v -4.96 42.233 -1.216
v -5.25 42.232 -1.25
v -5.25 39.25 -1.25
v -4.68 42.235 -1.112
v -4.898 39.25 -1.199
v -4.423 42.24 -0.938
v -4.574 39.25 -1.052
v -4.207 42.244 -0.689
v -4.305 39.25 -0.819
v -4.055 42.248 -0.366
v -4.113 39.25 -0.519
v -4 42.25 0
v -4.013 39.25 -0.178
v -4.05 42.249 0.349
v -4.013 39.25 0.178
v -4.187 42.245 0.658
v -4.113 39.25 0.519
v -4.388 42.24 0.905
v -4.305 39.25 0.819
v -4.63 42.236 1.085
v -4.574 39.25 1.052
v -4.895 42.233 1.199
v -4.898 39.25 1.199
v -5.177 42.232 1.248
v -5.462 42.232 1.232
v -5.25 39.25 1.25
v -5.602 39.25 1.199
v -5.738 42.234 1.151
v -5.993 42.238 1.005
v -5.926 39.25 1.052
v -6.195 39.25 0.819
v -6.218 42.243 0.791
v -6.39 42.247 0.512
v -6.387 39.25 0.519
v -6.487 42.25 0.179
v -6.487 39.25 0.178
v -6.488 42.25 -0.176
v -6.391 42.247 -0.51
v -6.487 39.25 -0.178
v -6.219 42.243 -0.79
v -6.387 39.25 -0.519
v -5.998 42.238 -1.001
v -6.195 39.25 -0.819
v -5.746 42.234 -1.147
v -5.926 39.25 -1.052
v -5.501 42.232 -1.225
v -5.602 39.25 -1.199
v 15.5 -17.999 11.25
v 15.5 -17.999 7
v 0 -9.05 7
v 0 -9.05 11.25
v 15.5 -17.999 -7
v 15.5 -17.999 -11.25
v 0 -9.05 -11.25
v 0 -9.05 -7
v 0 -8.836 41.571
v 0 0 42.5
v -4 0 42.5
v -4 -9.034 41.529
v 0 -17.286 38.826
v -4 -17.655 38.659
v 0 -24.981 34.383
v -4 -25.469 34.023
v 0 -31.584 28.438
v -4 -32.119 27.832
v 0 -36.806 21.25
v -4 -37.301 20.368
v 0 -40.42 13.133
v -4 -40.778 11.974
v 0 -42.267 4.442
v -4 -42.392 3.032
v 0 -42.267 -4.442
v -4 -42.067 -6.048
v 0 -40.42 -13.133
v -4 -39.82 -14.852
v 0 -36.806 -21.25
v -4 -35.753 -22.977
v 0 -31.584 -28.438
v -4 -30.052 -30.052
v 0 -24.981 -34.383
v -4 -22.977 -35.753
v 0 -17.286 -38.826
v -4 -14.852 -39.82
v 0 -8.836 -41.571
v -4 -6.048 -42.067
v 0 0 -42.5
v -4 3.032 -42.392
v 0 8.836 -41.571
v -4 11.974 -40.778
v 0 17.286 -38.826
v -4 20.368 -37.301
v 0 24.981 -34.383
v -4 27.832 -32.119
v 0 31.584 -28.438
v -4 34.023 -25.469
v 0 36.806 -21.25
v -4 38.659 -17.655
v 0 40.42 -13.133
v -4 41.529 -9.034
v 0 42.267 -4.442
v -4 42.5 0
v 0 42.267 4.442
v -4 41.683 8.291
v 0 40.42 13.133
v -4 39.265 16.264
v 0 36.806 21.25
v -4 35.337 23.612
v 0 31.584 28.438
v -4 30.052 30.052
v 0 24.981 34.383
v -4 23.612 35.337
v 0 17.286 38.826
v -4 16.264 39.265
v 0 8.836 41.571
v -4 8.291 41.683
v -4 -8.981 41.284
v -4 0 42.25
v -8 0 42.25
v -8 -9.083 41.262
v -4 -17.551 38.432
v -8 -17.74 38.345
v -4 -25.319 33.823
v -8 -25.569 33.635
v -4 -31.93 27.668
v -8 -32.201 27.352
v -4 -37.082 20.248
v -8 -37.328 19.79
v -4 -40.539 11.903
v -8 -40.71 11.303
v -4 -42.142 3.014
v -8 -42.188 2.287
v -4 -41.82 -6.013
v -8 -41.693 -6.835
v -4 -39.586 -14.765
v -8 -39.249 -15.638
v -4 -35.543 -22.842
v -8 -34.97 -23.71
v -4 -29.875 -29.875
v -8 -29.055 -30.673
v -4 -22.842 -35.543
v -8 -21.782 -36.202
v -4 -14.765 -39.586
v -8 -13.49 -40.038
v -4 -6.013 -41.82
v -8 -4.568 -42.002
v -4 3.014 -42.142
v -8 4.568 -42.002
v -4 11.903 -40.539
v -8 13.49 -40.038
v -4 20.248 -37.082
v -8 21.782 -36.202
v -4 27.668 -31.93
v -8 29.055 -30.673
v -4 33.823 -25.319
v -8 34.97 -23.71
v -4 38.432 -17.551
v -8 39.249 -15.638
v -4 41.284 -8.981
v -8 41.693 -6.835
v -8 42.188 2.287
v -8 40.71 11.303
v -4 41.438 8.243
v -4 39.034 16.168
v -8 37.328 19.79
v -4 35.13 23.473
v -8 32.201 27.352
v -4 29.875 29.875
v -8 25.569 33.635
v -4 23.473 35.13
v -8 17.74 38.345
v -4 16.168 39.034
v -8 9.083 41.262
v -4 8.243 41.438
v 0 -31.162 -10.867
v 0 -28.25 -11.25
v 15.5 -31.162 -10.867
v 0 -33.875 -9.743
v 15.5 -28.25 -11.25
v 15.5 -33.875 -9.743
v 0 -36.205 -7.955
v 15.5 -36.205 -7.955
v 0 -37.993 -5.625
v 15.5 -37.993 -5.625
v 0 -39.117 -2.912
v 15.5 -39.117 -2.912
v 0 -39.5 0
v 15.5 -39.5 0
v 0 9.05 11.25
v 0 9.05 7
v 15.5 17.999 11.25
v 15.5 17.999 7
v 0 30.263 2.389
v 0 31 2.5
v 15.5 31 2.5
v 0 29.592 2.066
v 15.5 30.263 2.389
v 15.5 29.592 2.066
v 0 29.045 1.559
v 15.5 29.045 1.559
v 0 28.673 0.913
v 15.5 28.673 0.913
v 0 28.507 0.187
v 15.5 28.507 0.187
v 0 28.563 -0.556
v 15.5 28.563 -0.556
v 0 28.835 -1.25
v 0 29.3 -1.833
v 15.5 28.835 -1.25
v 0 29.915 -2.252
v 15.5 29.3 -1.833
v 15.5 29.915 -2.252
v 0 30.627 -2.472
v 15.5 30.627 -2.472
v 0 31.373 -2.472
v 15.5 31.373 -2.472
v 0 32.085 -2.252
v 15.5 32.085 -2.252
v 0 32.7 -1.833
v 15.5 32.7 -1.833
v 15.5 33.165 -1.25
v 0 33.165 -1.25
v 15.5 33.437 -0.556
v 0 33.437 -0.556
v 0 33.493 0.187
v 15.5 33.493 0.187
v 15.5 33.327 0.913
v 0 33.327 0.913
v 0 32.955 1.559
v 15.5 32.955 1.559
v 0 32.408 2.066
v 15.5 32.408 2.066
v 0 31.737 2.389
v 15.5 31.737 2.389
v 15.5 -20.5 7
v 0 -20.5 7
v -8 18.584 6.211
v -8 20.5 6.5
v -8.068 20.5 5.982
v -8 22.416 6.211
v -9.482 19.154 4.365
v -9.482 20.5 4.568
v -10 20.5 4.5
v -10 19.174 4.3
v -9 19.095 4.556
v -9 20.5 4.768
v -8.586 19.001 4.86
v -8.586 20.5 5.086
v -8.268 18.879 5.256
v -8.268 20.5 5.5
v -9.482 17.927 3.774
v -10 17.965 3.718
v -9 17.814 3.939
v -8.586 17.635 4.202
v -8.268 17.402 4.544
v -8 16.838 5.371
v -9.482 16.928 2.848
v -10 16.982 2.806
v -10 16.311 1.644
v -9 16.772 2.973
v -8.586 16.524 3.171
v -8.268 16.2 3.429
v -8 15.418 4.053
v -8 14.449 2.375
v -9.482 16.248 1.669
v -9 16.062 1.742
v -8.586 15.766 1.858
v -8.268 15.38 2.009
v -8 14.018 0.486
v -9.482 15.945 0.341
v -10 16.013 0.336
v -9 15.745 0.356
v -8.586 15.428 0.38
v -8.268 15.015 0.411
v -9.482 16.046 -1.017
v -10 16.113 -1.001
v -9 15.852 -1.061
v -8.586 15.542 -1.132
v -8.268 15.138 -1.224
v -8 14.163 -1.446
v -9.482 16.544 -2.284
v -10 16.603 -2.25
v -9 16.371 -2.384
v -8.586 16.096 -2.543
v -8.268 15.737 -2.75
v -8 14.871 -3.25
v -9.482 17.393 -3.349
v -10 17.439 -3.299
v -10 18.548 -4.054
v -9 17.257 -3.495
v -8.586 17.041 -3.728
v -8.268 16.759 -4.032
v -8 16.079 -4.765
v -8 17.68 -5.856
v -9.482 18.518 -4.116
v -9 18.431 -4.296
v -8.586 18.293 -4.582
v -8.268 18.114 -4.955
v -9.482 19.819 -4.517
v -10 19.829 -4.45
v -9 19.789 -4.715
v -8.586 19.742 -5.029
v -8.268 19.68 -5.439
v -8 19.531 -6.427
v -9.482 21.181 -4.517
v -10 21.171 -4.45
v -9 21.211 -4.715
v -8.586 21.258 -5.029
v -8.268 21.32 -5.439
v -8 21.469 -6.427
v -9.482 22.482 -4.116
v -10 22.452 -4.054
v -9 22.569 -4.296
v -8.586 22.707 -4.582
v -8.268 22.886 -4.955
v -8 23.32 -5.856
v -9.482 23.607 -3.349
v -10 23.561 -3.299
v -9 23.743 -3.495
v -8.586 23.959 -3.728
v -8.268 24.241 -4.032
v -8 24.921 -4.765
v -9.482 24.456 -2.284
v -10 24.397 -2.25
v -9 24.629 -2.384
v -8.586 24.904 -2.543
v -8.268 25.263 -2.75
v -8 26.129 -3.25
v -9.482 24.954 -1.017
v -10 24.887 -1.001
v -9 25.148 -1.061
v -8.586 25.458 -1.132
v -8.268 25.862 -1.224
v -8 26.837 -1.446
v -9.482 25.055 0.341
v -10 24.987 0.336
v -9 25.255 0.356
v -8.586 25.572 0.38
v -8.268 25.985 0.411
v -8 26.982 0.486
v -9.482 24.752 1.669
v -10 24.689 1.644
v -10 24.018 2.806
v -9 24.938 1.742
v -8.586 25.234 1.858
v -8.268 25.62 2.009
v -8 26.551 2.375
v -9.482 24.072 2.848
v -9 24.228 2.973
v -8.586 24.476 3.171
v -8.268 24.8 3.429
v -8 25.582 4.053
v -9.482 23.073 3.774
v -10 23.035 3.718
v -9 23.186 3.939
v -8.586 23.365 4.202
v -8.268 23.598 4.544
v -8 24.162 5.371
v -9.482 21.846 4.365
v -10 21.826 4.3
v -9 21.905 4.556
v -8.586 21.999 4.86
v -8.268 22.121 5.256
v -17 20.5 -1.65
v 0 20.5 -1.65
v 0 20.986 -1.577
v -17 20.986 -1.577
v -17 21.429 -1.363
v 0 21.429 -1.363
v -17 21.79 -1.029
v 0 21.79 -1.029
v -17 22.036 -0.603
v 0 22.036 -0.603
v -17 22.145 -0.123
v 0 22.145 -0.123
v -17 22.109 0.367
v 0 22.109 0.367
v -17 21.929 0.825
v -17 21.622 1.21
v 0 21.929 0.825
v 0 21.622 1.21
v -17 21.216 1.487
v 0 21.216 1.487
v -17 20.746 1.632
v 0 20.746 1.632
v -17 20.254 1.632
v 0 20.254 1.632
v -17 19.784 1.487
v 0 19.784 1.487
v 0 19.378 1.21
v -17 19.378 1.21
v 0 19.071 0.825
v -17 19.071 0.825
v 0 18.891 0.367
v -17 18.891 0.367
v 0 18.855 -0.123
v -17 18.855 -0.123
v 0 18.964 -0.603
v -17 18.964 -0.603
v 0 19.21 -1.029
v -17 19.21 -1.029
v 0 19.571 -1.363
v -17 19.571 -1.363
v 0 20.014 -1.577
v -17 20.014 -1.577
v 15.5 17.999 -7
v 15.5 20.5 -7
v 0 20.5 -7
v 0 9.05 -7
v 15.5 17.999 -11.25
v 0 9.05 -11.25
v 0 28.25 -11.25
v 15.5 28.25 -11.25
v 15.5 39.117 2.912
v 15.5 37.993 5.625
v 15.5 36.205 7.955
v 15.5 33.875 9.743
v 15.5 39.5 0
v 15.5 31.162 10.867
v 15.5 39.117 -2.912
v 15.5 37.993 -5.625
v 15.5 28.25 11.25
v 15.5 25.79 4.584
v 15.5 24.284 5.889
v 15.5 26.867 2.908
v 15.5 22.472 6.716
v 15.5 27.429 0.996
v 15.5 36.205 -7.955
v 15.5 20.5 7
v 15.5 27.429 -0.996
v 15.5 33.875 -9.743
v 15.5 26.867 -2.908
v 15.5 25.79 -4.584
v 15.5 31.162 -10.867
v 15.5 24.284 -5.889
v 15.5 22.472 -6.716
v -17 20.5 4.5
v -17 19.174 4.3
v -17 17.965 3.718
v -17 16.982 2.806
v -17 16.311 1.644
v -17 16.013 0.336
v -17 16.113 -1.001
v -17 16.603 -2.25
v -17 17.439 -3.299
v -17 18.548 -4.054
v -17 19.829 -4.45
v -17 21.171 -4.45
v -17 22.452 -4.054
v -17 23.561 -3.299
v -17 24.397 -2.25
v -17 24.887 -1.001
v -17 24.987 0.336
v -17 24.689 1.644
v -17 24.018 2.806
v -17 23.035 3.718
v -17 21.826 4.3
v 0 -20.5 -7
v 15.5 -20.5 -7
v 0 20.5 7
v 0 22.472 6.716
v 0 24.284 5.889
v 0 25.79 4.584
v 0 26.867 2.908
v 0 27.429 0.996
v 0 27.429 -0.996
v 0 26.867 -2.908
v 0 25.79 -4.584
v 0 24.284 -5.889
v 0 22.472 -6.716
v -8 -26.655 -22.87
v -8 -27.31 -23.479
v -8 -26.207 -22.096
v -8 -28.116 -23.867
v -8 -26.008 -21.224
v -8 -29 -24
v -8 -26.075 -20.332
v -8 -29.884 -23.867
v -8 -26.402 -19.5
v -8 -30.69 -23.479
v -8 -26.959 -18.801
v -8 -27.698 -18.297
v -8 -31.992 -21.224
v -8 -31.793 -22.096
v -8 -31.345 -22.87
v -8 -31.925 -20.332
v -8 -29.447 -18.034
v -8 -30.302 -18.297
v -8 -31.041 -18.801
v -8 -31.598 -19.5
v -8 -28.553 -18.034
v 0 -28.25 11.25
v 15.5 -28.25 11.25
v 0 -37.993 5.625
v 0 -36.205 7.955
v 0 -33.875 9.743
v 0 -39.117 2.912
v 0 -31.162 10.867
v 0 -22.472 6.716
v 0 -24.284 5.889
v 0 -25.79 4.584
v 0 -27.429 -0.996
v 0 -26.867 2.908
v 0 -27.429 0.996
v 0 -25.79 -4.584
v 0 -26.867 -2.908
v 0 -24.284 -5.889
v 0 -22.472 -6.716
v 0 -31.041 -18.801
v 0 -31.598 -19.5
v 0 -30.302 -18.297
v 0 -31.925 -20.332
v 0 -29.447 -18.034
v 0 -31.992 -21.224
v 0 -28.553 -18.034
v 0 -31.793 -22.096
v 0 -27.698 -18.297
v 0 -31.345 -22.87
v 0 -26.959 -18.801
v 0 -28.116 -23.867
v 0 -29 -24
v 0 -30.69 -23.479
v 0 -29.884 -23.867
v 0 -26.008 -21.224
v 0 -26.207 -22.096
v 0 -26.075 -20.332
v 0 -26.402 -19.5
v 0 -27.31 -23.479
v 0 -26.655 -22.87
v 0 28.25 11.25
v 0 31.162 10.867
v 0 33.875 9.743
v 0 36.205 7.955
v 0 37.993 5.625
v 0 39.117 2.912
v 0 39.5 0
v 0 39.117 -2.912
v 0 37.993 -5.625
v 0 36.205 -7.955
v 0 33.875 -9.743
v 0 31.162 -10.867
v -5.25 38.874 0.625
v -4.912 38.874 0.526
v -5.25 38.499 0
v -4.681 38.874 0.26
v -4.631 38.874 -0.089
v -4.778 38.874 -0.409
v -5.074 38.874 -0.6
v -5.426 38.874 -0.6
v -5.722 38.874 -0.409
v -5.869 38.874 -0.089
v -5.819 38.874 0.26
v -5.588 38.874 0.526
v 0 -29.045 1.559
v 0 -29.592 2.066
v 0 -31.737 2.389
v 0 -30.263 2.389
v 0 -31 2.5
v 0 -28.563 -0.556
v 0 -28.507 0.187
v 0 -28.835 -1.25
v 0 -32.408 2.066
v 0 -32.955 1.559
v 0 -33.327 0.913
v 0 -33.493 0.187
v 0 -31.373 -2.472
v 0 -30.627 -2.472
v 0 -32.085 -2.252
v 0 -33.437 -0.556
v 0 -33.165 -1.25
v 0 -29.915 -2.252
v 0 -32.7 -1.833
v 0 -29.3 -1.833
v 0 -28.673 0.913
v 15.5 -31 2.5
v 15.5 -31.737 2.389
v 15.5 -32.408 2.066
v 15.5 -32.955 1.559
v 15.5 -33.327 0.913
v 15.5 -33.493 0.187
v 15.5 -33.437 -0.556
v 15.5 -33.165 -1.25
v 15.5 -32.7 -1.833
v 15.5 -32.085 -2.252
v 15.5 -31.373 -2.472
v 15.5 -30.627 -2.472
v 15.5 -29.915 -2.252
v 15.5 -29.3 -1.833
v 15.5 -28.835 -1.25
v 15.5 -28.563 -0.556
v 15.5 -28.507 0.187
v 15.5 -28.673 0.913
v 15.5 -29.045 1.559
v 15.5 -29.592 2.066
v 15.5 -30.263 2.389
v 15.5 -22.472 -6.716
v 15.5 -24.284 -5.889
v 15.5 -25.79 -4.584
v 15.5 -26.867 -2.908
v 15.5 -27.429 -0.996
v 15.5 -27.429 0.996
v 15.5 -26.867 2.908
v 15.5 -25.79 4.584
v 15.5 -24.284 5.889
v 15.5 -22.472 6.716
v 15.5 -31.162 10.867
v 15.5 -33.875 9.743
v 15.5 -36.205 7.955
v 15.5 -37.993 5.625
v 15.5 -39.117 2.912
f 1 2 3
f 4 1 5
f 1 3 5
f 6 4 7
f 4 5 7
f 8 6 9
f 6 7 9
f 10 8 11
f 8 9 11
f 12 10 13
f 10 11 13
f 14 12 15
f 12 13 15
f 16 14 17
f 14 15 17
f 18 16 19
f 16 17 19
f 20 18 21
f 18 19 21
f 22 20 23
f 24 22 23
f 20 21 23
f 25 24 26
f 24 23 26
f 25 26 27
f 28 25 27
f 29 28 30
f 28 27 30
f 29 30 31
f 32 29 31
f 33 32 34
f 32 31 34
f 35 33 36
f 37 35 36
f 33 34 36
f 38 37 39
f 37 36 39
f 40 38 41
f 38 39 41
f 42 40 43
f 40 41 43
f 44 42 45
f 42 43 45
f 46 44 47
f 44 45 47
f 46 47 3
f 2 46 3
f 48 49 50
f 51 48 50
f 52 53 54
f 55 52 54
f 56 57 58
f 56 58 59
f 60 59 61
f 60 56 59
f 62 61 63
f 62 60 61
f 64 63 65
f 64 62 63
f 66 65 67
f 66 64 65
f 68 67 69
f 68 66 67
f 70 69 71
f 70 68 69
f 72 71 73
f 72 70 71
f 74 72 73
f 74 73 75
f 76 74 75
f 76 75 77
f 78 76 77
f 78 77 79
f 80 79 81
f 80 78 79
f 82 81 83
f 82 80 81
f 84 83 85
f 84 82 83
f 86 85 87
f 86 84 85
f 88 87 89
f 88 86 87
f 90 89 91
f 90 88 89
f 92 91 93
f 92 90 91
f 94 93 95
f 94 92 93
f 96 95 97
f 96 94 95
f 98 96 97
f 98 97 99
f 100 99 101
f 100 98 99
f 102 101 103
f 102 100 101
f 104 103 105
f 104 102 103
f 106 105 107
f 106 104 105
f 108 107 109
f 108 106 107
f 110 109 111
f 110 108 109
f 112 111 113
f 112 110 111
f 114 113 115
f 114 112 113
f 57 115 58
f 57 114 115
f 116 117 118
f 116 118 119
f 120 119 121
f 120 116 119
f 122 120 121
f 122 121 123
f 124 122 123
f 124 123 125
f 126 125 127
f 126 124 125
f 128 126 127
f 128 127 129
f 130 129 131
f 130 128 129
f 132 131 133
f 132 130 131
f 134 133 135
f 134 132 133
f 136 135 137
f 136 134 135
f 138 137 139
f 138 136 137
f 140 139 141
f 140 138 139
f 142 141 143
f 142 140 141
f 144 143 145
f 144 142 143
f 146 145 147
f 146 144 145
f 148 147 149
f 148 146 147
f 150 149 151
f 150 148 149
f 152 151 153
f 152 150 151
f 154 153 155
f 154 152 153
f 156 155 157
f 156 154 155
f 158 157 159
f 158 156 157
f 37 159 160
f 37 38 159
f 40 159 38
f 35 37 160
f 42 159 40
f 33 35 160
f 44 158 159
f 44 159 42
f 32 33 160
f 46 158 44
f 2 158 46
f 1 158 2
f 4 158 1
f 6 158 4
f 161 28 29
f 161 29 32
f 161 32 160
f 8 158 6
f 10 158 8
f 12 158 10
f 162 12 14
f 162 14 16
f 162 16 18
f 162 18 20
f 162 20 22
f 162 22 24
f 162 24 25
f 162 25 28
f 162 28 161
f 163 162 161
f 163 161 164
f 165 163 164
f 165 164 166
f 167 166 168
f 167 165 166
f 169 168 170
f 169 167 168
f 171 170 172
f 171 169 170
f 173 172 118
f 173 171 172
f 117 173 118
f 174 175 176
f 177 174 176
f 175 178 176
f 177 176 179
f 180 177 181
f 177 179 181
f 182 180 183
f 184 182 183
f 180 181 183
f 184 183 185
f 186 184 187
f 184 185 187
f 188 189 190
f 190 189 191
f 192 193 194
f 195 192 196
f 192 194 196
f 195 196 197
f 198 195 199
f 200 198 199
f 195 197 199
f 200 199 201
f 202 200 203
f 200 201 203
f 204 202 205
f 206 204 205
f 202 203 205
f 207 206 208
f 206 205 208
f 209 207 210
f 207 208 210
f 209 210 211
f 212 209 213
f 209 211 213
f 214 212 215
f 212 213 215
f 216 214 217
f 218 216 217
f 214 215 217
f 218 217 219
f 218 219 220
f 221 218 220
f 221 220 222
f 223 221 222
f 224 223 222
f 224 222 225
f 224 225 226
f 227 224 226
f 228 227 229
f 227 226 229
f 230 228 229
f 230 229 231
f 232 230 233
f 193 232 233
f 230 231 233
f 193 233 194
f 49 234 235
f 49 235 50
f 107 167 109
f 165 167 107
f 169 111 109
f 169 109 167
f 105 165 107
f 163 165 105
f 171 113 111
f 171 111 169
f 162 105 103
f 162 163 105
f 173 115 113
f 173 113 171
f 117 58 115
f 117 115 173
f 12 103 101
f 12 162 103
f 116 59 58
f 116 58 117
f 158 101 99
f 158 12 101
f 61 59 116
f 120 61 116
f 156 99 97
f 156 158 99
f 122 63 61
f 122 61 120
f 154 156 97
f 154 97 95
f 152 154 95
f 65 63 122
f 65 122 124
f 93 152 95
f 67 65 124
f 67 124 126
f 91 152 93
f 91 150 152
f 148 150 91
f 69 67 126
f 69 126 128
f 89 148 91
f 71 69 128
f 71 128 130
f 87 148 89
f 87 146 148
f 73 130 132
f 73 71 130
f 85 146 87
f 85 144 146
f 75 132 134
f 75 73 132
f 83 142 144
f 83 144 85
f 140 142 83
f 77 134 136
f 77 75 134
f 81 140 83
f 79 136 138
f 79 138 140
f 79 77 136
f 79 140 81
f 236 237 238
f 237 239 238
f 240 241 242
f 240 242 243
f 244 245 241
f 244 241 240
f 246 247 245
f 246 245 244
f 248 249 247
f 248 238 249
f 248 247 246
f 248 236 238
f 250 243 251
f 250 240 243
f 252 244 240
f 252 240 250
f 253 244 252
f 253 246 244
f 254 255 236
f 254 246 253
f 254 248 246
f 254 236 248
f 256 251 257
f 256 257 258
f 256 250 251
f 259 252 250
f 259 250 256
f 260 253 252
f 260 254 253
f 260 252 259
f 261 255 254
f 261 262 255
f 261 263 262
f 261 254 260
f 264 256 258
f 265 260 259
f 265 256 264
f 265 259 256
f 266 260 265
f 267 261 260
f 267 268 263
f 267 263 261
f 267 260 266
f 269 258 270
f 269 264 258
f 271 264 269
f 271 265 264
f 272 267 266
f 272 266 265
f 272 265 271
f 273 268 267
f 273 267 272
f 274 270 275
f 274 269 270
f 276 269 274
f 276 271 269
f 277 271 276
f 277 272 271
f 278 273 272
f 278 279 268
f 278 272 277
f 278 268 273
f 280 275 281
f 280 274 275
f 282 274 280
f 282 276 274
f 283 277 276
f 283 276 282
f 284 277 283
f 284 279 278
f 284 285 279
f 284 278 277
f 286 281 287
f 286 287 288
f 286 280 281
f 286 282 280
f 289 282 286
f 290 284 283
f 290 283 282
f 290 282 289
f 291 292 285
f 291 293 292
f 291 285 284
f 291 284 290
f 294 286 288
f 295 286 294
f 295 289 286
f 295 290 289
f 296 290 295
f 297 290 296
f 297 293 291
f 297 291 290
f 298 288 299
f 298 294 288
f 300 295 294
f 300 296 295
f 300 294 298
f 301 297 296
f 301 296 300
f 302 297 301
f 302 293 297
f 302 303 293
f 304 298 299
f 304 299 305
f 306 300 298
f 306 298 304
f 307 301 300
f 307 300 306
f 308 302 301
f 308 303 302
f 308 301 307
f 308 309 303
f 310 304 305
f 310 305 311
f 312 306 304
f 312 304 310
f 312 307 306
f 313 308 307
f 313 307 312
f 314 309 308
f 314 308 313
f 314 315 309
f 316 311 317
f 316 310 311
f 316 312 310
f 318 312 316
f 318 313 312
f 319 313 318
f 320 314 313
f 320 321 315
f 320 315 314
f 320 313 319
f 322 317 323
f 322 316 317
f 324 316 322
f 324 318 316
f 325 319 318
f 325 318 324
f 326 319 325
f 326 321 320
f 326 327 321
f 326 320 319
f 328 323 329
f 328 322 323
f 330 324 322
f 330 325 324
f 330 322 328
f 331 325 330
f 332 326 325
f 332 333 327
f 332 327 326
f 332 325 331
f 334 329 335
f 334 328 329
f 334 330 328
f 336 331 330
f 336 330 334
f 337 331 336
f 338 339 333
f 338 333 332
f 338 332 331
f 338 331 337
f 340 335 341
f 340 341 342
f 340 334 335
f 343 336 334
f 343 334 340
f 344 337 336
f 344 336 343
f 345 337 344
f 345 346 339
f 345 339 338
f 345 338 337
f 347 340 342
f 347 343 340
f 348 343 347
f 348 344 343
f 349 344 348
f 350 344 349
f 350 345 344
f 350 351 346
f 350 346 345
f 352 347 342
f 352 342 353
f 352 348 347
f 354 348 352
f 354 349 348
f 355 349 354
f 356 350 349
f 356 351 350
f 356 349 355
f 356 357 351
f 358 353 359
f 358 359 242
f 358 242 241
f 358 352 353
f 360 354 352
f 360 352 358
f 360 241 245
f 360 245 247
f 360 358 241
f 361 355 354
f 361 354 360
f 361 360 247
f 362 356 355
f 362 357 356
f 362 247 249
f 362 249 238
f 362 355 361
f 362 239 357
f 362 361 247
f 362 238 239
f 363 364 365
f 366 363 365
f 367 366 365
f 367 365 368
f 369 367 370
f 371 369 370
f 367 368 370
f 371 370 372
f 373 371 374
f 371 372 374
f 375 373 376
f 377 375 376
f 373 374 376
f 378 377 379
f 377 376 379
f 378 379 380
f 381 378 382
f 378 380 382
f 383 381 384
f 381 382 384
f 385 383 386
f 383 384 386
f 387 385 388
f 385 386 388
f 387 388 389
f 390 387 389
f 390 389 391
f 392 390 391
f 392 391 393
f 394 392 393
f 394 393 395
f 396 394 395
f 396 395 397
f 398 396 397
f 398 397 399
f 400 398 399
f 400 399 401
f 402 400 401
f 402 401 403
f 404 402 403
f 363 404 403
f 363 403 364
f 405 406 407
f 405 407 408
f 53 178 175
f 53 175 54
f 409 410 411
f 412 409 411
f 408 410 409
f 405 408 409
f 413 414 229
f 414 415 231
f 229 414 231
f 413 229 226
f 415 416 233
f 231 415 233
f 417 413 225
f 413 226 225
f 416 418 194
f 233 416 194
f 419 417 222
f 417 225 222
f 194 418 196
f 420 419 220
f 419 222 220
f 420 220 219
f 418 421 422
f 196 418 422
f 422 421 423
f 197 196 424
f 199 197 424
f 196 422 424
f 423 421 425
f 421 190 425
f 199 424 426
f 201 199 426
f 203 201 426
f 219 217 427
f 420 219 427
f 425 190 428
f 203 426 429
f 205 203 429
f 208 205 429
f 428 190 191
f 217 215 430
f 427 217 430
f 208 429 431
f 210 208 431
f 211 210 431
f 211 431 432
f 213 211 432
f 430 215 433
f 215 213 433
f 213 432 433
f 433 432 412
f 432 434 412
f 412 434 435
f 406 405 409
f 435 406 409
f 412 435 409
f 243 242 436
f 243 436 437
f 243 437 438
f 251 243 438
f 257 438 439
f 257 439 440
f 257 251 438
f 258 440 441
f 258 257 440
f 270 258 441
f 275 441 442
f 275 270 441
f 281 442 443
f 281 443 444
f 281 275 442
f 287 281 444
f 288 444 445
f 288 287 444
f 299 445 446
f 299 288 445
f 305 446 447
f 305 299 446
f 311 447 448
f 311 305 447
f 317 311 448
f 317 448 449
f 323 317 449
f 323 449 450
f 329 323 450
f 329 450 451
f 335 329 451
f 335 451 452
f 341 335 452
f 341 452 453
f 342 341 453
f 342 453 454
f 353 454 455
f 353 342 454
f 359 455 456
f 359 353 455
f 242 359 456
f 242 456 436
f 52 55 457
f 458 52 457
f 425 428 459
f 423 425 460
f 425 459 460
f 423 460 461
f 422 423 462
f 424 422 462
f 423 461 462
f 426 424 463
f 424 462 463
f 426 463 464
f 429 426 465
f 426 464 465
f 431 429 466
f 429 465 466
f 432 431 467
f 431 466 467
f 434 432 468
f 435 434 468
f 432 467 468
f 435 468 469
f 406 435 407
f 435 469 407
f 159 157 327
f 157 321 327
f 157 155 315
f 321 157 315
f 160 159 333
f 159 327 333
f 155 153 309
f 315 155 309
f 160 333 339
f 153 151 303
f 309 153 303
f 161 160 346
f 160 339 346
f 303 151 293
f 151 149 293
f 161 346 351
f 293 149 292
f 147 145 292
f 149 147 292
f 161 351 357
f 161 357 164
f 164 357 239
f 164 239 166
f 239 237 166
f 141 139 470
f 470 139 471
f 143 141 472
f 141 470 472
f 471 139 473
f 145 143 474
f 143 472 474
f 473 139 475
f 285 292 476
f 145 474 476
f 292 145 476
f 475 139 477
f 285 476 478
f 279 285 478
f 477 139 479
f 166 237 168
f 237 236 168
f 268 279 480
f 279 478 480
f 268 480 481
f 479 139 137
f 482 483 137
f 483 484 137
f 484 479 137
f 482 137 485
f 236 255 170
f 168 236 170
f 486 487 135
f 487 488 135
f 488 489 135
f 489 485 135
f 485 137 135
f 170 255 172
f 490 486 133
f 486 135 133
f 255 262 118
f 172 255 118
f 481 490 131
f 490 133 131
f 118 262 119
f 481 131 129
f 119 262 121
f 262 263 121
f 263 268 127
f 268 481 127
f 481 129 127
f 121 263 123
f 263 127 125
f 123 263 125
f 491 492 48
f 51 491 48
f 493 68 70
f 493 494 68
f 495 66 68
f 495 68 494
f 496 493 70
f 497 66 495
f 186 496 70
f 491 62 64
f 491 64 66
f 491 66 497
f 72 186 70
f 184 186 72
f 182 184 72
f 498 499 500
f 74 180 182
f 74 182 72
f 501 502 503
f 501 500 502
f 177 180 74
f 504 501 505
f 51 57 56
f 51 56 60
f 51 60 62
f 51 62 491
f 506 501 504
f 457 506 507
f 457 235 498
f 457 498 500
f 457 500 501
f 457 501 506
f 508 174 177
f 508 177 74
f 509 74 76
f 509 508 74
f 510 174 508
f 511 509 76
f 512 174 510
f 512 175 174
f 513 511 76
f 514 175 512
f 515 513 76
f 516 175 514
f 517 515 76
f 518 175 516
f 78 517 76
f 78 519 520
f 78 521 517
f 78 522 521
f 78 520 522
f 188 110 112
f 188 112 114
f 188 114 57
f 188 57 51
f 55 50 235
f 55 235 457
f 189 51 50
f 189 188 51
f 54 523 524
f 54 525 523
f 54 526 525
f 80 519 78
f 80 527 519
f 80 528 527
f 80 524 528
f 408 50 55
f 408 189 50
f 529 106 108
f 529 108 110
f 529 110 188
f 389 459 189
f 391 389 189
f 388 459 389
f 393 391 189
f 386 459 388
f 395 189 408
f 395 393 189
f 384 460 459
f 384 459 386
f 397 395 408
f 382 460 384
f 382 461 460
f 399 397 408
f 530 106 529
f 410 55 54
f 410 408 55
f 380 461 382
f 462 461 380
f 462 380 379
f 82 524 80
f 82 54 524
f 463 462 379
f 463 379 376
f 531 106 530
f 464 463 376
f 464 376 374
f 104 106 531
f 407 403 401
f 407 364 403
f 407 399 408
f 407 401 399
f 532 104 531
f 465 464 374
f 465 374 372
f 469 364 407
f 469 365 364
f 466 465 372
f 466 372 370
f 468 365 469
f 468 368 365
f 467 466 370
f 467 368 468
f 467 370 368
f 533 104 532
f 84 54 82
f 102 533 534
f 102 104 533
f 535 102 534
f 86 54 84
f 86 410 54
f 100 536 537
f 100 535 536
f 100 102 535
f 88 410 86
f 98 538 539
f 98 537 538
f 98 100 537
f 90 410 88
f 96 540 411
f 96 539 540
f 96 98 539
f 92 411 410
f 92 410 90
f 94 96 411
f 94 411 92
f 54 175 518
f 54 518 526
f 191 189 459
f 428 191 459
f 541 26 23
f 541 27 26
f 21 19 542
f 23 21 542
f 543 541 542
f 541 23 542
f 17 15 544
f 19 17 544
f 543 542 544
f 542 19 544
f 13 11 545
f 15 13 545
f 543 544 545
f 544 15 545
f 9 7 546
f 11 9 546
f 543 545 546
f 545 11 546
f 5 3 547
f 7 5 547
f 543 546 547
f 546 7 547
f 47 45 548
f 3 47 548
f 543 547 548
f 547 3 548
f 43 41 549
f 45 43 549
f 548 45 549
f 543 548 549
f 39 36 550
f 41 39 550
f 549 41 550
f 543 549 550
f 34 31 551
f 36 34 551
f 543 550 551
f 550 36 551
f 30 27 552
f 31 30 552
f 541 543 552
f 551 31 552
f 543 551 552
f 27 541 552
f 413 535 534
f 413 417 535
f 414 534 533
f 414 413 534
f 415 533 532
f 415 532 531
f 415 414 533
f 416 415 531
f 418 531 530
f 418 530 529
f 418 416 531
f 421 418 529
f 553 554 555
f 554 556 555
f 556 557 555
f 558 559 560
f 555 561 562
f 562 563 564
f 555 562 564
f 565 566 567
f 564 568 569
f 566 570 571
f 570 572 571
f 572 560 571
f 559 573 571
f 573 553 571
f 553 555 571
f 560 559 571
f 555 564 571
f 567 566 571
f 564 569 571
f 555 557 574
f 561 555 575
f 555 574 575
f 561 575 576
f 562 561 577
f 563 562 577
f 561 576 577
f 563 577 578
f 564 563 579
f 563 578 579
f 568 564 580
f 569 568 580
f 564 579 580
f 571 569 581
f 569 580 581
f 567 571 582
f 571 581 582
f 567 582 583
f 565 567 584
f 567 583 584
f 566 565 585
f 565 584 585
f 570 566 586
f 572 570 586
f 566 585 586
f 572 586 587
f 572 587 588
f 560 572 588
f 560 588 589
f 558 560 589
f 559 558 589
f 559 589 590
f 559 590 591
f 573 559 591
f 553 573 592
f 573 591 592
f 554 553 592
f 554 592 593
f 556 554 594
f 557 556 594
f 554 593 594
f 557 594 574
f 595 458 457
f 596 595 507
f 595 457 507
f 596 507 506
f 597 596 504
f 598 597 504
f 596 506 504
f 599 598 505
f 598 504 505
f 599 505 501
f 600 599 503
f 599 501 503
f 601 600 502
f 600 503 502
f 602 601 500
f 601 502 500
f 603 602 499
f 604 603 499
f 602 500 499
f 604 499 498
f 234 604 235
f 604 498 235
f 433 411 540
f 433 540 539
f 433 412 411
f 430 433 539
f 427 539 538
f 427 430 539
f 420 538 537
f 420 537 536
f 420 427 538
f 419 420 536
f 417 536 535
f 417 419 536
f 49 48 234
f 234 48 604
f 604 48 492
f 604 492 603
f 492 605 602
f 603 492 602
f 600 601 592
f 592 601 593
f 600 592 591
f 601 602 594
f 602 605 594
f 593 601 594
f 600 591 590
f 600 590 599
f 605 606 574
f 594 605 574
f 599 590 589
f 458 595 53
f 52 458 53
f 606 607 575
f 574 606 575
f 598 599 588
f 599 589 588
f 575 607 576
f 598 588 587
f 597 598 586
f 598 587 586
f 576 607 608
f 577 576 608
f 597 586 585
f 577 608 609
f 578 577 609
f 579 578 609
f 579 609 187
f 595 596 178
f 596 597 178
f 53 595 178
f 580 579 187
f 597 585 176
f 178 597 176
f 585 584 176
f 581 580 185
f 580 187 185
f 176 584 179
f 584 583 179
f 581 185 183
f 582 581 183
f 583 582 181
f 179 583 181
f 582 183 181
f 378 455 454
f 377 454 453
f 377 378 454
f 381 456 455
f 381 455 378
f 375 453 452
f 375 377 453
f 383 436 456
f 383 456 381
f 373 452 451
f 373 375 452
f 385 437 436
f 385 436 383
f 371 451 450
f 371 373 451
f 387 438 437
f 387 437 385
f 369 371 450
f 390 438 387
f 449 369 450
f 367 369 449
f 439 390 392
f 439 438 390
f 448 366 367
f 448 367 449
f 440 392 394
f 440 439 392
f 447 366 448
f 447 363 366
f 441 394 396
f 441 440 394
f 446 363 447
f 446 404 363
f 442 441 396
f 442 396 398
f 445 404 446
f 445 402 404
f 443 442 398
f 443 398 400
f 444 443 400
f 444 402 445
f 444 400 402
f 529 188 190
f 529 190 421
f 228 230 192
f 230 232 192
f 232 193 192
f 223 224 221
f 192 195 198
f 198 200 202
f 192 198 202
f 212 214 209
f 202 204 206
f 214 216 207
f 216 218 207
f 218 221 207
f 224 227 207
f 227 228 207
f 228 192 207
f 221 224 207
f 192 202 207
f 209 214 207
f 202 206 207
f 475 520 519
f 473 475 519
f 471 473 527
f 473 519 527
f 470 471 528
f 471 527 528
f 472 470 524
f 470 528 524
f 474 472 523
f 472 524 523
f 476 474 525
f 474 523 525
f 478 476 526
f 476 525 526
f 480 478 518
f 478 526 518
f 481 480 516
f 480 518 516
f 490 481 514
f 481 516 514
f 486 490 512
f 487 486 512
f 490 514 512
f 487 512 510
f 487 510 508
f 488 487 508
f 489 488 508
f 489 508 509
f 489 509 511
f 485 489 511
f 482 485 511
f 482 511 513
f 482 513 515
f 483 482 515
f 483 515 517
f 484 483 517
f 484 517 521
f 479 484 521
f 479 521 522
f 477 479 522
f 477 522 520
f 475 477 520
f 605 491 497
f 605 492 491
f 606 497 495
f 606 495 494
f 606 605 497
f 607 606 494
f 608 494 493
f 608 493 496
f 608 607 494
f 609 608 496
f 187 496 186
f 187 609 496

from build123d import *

# Parameters (mm, degrees)
ESQUISSE1_W                         = 32.5
ESQUISSE1_H                         = 42.5
ESQUISSE2_W                         = 9
ESQUISSE2_H                         = 58.5
CONG_R2_R                           = 2
ESQUISSE3_W                         = 4
ESQUISSE3_H                         = 0.25
D_GROSSISEMENT_OUTLINE_R            = 42.5
D_GROSSISEMENT_OUTLINE_W            = 22.5
D_GROSSISEMENT_OUTLINE_H            = 79
D_GROSSISEMENT_DEPTH                = 15.5
FINITION_EXT_R                      = 11.25
USINAGE_EN_V_DEPTH                  = 63.461988441
USINAGE_EN_V_DEPTH_BACK             = 63.461988441
RAINURE_INT_DEPTH                   = 63.461988441
ESQUISSE10_W                        = 2.5
ESQUISSE10_H                        = 15.5
TROU_TARAUD_M61_AT_2_COUNT          = 2
TROU_TARAUD_M61_AT_2_PITCH          = 62
TROU_TARAUD_M41_D                   = 3.3
DIAM_TRE_DU_PER_AGE_6_0_6_1_D       = 6
DIAM_TRE_DU_PER_AGE_2_5_2_5_1_D     = 2.5
DIAM_TRE_DU_PER_AGE_2_5_2_5_1_DEPTH = 3
DIAM_TRE_DU_PER_AGE_2_5_2_5_1_TIP   = 0.751075774


# Read off the part's stored shape, not the designer's step: Dégrossisement
with BuildPart() as part:
    # Esquisse1 → Brut (revolve)
    with BuildSketch(Plane.XY, mode=Mode.PRIVATE) as brut_sk:
        with Locations((-0.75, 21.25)):
            Rectangle(ESQUISSE1_W, ESQUISSE1_H)
    revolve(brut_sk.sketch.rotate(Axis((-714.885574261, 0, 0), (1, 0, 0)), 90), axis=Axis((-714.885574261, 0, 0), (1, 0, 0)))

    # Esquisse2 → Pion désaxer (revolve, cut)
    with BuildSketch(Plane.XY, mode=Mode.PRIVATE) as pion_d_saxer_sk:
        with Locations((-12.5, -13.25)):
            Rectangle(ESQUISSE2_W, ESQUISSE2_H)
    revolve(pion_d_saxer_sk.sketch.rotate(Axis((-1017, 20.5, 0), (1, 0, 0)), 270), axis=Axis((-1017, 20.5, 0), (1, 0, 0)), mode=Mode.SUBTRACT)

    # Congé R2
    cong_r2_edges = [part.edges().sort_by_distance(p)[0] for p in [
        (-8, 20.5, -4.5),
    ]]
    fillet(cong_r2_edges, radius=CONG_R2_R)

    # Esquisse3 → Enlèv. Ø83d9 (revolve, cut)
    with BuildSketch(Plane.XY, mode=Mode.PRIVATE) as enl_v_83d9_sk:
        with Locations((-6, 42.375)):
            Rectangle(ESQUISSE3_W, ESQUISSE3_H)
    revolve(enl_v_83d9_sk.sketch.rotate(Axis((-1000, 0, 0), (1, 0, 0)), 90), axis=Axis((-1000, 0, 0), (1, 0, 0)), mode=Mode.SUBTRACT)

    # Dégrossisement outline → Dégrossisement (cut)
    with BuildSketch(Plane(origin=(0, 0, 0), x_dir=(0, 0, -1), z_dir=(1, 0, 0))):
        Circle(D_GROSSISEMENT_OUTLINE_R)
        Rectangle(D_GROSSISEMENT_OUTLINE_W, D_GROSSISEMENT_OUTLINE_H, mode=Mode.SUBTRACT)
    extrude(amount=D_GROSSISEMENT_DEPTH, mode=Mode.SUBTRACT)

    # Finition ext.
    finition_ext_edges = [part.edges().sort_by_distance(p)[0] for p in [
        (7.75, -39.5, -11.25),
        (7.75, -39.5, 11.25),
        (7.75, 39.5, -11.25),
        (7.75, 39.5, 11.25),
    ]]
    fillet(finition_ext_edges, radius=FINITION_EXT_R - 0.0001)  # a hair under: the kernel refuses the full size

    # Esquisse5 → Usinage en V (cut, two sides: drawn at the far end of the back side and taken through both)
    with BuildSketch(Plane.XY.offset(-USINAGE_EN_V_DEPTH_BACK)):
        Polygon((0, -9.05), (0, 9.05), (15.5, 17.998929172), (15.5, -17.998929172), align=None)
    extrude(amount=USINAGE_EN_V_DEPTH + USINAGE_EN_V_DEPTH_BACK, mode=Mode.SUBTRACT)

    # Esquisse6 → Rainure Int. (cut, through all)
    with BuildSketch(Plane(origin=(0, 0, 0), x_dir=(0, 0, -1), z_dir=(1, 0, 0))):
        with BuildLine():
            Line((7, 20.5), (7, -20.5))
            ThreePointArc((7, -20.5), (0, -27.5), (-7, -20.5))
            Line((-7, -20.5), (-7, 20.5))
            ThreePointArc((-7, 20.5), (0, 27.5), (7, 20.5))
        make_face()
    extrude(amount=RAINURE_INT_DEPTH, mode=Mode.SUBTRACT)

    # Esquisse10 → Trou taraudé M61 (revolve, cut)
    with BuildSketch(Plane.ZX.offset(31)):
        with Locations((1.25, 7.75)):
            Rectangle(ESQUISSE10_W, ESQUISSE10_H)
    trou_taraud_m61 = revolve(axis=Axis((-6.35, 31, 0), (1, 0, 0)), mode=Mode.SUBTRACT)

    # Trou taraudé M61 at 2: Trou taraudé M61 ×2
    with Locations(*[(0, -i * TROU_TARAUD_M61_AT_2_PITCH, 0) for i in range(1, TROU_TARAUD_M61_AT_2_COUNT)]):
        add(trou_taraud_m61, mode=Mode.SUBTRACT)

    # Trou taraudé M41 (through all)
    with Locations(Plane.ZY.offset(17)):
        with Locations((0, 20.5)):
            Hole(TROU_TARAUD_M41_D / 2)

    # Diamètre du perçage Ø6.0 (6)1 (through all)
    with Locations(Plane.ZY.offset(8)):
        with Locations((-21, -29)):
            Hole(DIAM_TRE_DU_PER_AGE_6_0_6_1_D / 2)

    # Diamètre du perçage Ø2.5 (2.5)1
    with Locations(Plane(origin=(-5.25, 42.25, 0), x_dir=(0, 0, 1), z_dir=(0, 1, 0))):
        with Locations((0, 0)):
            Hole(DIAM_TRE_DU_PER_AGE_2_5_2_5_1_D / 2, depth=DIAM_TRE_DU_PER_AGE_2_5_2_5_1_DEPTH)
            with Locations((0, 0, -(DIAM_TRE_DU_PER_AGE_2_5_2_5_1_DEPTH + DIAM_TRE_DU_PER_AGE_2_5_2_5_1_TIP / 2))):  # 118° drill point
                Cone(0, DIAM_TRE_DU_PER_AGE_2_5_2_5_1_D / 2, DIAM_TRE_DU_PER_AGE_2_5_2_5_1_TIP, mode=Mode.SUBTRACT)


solid = part.part
